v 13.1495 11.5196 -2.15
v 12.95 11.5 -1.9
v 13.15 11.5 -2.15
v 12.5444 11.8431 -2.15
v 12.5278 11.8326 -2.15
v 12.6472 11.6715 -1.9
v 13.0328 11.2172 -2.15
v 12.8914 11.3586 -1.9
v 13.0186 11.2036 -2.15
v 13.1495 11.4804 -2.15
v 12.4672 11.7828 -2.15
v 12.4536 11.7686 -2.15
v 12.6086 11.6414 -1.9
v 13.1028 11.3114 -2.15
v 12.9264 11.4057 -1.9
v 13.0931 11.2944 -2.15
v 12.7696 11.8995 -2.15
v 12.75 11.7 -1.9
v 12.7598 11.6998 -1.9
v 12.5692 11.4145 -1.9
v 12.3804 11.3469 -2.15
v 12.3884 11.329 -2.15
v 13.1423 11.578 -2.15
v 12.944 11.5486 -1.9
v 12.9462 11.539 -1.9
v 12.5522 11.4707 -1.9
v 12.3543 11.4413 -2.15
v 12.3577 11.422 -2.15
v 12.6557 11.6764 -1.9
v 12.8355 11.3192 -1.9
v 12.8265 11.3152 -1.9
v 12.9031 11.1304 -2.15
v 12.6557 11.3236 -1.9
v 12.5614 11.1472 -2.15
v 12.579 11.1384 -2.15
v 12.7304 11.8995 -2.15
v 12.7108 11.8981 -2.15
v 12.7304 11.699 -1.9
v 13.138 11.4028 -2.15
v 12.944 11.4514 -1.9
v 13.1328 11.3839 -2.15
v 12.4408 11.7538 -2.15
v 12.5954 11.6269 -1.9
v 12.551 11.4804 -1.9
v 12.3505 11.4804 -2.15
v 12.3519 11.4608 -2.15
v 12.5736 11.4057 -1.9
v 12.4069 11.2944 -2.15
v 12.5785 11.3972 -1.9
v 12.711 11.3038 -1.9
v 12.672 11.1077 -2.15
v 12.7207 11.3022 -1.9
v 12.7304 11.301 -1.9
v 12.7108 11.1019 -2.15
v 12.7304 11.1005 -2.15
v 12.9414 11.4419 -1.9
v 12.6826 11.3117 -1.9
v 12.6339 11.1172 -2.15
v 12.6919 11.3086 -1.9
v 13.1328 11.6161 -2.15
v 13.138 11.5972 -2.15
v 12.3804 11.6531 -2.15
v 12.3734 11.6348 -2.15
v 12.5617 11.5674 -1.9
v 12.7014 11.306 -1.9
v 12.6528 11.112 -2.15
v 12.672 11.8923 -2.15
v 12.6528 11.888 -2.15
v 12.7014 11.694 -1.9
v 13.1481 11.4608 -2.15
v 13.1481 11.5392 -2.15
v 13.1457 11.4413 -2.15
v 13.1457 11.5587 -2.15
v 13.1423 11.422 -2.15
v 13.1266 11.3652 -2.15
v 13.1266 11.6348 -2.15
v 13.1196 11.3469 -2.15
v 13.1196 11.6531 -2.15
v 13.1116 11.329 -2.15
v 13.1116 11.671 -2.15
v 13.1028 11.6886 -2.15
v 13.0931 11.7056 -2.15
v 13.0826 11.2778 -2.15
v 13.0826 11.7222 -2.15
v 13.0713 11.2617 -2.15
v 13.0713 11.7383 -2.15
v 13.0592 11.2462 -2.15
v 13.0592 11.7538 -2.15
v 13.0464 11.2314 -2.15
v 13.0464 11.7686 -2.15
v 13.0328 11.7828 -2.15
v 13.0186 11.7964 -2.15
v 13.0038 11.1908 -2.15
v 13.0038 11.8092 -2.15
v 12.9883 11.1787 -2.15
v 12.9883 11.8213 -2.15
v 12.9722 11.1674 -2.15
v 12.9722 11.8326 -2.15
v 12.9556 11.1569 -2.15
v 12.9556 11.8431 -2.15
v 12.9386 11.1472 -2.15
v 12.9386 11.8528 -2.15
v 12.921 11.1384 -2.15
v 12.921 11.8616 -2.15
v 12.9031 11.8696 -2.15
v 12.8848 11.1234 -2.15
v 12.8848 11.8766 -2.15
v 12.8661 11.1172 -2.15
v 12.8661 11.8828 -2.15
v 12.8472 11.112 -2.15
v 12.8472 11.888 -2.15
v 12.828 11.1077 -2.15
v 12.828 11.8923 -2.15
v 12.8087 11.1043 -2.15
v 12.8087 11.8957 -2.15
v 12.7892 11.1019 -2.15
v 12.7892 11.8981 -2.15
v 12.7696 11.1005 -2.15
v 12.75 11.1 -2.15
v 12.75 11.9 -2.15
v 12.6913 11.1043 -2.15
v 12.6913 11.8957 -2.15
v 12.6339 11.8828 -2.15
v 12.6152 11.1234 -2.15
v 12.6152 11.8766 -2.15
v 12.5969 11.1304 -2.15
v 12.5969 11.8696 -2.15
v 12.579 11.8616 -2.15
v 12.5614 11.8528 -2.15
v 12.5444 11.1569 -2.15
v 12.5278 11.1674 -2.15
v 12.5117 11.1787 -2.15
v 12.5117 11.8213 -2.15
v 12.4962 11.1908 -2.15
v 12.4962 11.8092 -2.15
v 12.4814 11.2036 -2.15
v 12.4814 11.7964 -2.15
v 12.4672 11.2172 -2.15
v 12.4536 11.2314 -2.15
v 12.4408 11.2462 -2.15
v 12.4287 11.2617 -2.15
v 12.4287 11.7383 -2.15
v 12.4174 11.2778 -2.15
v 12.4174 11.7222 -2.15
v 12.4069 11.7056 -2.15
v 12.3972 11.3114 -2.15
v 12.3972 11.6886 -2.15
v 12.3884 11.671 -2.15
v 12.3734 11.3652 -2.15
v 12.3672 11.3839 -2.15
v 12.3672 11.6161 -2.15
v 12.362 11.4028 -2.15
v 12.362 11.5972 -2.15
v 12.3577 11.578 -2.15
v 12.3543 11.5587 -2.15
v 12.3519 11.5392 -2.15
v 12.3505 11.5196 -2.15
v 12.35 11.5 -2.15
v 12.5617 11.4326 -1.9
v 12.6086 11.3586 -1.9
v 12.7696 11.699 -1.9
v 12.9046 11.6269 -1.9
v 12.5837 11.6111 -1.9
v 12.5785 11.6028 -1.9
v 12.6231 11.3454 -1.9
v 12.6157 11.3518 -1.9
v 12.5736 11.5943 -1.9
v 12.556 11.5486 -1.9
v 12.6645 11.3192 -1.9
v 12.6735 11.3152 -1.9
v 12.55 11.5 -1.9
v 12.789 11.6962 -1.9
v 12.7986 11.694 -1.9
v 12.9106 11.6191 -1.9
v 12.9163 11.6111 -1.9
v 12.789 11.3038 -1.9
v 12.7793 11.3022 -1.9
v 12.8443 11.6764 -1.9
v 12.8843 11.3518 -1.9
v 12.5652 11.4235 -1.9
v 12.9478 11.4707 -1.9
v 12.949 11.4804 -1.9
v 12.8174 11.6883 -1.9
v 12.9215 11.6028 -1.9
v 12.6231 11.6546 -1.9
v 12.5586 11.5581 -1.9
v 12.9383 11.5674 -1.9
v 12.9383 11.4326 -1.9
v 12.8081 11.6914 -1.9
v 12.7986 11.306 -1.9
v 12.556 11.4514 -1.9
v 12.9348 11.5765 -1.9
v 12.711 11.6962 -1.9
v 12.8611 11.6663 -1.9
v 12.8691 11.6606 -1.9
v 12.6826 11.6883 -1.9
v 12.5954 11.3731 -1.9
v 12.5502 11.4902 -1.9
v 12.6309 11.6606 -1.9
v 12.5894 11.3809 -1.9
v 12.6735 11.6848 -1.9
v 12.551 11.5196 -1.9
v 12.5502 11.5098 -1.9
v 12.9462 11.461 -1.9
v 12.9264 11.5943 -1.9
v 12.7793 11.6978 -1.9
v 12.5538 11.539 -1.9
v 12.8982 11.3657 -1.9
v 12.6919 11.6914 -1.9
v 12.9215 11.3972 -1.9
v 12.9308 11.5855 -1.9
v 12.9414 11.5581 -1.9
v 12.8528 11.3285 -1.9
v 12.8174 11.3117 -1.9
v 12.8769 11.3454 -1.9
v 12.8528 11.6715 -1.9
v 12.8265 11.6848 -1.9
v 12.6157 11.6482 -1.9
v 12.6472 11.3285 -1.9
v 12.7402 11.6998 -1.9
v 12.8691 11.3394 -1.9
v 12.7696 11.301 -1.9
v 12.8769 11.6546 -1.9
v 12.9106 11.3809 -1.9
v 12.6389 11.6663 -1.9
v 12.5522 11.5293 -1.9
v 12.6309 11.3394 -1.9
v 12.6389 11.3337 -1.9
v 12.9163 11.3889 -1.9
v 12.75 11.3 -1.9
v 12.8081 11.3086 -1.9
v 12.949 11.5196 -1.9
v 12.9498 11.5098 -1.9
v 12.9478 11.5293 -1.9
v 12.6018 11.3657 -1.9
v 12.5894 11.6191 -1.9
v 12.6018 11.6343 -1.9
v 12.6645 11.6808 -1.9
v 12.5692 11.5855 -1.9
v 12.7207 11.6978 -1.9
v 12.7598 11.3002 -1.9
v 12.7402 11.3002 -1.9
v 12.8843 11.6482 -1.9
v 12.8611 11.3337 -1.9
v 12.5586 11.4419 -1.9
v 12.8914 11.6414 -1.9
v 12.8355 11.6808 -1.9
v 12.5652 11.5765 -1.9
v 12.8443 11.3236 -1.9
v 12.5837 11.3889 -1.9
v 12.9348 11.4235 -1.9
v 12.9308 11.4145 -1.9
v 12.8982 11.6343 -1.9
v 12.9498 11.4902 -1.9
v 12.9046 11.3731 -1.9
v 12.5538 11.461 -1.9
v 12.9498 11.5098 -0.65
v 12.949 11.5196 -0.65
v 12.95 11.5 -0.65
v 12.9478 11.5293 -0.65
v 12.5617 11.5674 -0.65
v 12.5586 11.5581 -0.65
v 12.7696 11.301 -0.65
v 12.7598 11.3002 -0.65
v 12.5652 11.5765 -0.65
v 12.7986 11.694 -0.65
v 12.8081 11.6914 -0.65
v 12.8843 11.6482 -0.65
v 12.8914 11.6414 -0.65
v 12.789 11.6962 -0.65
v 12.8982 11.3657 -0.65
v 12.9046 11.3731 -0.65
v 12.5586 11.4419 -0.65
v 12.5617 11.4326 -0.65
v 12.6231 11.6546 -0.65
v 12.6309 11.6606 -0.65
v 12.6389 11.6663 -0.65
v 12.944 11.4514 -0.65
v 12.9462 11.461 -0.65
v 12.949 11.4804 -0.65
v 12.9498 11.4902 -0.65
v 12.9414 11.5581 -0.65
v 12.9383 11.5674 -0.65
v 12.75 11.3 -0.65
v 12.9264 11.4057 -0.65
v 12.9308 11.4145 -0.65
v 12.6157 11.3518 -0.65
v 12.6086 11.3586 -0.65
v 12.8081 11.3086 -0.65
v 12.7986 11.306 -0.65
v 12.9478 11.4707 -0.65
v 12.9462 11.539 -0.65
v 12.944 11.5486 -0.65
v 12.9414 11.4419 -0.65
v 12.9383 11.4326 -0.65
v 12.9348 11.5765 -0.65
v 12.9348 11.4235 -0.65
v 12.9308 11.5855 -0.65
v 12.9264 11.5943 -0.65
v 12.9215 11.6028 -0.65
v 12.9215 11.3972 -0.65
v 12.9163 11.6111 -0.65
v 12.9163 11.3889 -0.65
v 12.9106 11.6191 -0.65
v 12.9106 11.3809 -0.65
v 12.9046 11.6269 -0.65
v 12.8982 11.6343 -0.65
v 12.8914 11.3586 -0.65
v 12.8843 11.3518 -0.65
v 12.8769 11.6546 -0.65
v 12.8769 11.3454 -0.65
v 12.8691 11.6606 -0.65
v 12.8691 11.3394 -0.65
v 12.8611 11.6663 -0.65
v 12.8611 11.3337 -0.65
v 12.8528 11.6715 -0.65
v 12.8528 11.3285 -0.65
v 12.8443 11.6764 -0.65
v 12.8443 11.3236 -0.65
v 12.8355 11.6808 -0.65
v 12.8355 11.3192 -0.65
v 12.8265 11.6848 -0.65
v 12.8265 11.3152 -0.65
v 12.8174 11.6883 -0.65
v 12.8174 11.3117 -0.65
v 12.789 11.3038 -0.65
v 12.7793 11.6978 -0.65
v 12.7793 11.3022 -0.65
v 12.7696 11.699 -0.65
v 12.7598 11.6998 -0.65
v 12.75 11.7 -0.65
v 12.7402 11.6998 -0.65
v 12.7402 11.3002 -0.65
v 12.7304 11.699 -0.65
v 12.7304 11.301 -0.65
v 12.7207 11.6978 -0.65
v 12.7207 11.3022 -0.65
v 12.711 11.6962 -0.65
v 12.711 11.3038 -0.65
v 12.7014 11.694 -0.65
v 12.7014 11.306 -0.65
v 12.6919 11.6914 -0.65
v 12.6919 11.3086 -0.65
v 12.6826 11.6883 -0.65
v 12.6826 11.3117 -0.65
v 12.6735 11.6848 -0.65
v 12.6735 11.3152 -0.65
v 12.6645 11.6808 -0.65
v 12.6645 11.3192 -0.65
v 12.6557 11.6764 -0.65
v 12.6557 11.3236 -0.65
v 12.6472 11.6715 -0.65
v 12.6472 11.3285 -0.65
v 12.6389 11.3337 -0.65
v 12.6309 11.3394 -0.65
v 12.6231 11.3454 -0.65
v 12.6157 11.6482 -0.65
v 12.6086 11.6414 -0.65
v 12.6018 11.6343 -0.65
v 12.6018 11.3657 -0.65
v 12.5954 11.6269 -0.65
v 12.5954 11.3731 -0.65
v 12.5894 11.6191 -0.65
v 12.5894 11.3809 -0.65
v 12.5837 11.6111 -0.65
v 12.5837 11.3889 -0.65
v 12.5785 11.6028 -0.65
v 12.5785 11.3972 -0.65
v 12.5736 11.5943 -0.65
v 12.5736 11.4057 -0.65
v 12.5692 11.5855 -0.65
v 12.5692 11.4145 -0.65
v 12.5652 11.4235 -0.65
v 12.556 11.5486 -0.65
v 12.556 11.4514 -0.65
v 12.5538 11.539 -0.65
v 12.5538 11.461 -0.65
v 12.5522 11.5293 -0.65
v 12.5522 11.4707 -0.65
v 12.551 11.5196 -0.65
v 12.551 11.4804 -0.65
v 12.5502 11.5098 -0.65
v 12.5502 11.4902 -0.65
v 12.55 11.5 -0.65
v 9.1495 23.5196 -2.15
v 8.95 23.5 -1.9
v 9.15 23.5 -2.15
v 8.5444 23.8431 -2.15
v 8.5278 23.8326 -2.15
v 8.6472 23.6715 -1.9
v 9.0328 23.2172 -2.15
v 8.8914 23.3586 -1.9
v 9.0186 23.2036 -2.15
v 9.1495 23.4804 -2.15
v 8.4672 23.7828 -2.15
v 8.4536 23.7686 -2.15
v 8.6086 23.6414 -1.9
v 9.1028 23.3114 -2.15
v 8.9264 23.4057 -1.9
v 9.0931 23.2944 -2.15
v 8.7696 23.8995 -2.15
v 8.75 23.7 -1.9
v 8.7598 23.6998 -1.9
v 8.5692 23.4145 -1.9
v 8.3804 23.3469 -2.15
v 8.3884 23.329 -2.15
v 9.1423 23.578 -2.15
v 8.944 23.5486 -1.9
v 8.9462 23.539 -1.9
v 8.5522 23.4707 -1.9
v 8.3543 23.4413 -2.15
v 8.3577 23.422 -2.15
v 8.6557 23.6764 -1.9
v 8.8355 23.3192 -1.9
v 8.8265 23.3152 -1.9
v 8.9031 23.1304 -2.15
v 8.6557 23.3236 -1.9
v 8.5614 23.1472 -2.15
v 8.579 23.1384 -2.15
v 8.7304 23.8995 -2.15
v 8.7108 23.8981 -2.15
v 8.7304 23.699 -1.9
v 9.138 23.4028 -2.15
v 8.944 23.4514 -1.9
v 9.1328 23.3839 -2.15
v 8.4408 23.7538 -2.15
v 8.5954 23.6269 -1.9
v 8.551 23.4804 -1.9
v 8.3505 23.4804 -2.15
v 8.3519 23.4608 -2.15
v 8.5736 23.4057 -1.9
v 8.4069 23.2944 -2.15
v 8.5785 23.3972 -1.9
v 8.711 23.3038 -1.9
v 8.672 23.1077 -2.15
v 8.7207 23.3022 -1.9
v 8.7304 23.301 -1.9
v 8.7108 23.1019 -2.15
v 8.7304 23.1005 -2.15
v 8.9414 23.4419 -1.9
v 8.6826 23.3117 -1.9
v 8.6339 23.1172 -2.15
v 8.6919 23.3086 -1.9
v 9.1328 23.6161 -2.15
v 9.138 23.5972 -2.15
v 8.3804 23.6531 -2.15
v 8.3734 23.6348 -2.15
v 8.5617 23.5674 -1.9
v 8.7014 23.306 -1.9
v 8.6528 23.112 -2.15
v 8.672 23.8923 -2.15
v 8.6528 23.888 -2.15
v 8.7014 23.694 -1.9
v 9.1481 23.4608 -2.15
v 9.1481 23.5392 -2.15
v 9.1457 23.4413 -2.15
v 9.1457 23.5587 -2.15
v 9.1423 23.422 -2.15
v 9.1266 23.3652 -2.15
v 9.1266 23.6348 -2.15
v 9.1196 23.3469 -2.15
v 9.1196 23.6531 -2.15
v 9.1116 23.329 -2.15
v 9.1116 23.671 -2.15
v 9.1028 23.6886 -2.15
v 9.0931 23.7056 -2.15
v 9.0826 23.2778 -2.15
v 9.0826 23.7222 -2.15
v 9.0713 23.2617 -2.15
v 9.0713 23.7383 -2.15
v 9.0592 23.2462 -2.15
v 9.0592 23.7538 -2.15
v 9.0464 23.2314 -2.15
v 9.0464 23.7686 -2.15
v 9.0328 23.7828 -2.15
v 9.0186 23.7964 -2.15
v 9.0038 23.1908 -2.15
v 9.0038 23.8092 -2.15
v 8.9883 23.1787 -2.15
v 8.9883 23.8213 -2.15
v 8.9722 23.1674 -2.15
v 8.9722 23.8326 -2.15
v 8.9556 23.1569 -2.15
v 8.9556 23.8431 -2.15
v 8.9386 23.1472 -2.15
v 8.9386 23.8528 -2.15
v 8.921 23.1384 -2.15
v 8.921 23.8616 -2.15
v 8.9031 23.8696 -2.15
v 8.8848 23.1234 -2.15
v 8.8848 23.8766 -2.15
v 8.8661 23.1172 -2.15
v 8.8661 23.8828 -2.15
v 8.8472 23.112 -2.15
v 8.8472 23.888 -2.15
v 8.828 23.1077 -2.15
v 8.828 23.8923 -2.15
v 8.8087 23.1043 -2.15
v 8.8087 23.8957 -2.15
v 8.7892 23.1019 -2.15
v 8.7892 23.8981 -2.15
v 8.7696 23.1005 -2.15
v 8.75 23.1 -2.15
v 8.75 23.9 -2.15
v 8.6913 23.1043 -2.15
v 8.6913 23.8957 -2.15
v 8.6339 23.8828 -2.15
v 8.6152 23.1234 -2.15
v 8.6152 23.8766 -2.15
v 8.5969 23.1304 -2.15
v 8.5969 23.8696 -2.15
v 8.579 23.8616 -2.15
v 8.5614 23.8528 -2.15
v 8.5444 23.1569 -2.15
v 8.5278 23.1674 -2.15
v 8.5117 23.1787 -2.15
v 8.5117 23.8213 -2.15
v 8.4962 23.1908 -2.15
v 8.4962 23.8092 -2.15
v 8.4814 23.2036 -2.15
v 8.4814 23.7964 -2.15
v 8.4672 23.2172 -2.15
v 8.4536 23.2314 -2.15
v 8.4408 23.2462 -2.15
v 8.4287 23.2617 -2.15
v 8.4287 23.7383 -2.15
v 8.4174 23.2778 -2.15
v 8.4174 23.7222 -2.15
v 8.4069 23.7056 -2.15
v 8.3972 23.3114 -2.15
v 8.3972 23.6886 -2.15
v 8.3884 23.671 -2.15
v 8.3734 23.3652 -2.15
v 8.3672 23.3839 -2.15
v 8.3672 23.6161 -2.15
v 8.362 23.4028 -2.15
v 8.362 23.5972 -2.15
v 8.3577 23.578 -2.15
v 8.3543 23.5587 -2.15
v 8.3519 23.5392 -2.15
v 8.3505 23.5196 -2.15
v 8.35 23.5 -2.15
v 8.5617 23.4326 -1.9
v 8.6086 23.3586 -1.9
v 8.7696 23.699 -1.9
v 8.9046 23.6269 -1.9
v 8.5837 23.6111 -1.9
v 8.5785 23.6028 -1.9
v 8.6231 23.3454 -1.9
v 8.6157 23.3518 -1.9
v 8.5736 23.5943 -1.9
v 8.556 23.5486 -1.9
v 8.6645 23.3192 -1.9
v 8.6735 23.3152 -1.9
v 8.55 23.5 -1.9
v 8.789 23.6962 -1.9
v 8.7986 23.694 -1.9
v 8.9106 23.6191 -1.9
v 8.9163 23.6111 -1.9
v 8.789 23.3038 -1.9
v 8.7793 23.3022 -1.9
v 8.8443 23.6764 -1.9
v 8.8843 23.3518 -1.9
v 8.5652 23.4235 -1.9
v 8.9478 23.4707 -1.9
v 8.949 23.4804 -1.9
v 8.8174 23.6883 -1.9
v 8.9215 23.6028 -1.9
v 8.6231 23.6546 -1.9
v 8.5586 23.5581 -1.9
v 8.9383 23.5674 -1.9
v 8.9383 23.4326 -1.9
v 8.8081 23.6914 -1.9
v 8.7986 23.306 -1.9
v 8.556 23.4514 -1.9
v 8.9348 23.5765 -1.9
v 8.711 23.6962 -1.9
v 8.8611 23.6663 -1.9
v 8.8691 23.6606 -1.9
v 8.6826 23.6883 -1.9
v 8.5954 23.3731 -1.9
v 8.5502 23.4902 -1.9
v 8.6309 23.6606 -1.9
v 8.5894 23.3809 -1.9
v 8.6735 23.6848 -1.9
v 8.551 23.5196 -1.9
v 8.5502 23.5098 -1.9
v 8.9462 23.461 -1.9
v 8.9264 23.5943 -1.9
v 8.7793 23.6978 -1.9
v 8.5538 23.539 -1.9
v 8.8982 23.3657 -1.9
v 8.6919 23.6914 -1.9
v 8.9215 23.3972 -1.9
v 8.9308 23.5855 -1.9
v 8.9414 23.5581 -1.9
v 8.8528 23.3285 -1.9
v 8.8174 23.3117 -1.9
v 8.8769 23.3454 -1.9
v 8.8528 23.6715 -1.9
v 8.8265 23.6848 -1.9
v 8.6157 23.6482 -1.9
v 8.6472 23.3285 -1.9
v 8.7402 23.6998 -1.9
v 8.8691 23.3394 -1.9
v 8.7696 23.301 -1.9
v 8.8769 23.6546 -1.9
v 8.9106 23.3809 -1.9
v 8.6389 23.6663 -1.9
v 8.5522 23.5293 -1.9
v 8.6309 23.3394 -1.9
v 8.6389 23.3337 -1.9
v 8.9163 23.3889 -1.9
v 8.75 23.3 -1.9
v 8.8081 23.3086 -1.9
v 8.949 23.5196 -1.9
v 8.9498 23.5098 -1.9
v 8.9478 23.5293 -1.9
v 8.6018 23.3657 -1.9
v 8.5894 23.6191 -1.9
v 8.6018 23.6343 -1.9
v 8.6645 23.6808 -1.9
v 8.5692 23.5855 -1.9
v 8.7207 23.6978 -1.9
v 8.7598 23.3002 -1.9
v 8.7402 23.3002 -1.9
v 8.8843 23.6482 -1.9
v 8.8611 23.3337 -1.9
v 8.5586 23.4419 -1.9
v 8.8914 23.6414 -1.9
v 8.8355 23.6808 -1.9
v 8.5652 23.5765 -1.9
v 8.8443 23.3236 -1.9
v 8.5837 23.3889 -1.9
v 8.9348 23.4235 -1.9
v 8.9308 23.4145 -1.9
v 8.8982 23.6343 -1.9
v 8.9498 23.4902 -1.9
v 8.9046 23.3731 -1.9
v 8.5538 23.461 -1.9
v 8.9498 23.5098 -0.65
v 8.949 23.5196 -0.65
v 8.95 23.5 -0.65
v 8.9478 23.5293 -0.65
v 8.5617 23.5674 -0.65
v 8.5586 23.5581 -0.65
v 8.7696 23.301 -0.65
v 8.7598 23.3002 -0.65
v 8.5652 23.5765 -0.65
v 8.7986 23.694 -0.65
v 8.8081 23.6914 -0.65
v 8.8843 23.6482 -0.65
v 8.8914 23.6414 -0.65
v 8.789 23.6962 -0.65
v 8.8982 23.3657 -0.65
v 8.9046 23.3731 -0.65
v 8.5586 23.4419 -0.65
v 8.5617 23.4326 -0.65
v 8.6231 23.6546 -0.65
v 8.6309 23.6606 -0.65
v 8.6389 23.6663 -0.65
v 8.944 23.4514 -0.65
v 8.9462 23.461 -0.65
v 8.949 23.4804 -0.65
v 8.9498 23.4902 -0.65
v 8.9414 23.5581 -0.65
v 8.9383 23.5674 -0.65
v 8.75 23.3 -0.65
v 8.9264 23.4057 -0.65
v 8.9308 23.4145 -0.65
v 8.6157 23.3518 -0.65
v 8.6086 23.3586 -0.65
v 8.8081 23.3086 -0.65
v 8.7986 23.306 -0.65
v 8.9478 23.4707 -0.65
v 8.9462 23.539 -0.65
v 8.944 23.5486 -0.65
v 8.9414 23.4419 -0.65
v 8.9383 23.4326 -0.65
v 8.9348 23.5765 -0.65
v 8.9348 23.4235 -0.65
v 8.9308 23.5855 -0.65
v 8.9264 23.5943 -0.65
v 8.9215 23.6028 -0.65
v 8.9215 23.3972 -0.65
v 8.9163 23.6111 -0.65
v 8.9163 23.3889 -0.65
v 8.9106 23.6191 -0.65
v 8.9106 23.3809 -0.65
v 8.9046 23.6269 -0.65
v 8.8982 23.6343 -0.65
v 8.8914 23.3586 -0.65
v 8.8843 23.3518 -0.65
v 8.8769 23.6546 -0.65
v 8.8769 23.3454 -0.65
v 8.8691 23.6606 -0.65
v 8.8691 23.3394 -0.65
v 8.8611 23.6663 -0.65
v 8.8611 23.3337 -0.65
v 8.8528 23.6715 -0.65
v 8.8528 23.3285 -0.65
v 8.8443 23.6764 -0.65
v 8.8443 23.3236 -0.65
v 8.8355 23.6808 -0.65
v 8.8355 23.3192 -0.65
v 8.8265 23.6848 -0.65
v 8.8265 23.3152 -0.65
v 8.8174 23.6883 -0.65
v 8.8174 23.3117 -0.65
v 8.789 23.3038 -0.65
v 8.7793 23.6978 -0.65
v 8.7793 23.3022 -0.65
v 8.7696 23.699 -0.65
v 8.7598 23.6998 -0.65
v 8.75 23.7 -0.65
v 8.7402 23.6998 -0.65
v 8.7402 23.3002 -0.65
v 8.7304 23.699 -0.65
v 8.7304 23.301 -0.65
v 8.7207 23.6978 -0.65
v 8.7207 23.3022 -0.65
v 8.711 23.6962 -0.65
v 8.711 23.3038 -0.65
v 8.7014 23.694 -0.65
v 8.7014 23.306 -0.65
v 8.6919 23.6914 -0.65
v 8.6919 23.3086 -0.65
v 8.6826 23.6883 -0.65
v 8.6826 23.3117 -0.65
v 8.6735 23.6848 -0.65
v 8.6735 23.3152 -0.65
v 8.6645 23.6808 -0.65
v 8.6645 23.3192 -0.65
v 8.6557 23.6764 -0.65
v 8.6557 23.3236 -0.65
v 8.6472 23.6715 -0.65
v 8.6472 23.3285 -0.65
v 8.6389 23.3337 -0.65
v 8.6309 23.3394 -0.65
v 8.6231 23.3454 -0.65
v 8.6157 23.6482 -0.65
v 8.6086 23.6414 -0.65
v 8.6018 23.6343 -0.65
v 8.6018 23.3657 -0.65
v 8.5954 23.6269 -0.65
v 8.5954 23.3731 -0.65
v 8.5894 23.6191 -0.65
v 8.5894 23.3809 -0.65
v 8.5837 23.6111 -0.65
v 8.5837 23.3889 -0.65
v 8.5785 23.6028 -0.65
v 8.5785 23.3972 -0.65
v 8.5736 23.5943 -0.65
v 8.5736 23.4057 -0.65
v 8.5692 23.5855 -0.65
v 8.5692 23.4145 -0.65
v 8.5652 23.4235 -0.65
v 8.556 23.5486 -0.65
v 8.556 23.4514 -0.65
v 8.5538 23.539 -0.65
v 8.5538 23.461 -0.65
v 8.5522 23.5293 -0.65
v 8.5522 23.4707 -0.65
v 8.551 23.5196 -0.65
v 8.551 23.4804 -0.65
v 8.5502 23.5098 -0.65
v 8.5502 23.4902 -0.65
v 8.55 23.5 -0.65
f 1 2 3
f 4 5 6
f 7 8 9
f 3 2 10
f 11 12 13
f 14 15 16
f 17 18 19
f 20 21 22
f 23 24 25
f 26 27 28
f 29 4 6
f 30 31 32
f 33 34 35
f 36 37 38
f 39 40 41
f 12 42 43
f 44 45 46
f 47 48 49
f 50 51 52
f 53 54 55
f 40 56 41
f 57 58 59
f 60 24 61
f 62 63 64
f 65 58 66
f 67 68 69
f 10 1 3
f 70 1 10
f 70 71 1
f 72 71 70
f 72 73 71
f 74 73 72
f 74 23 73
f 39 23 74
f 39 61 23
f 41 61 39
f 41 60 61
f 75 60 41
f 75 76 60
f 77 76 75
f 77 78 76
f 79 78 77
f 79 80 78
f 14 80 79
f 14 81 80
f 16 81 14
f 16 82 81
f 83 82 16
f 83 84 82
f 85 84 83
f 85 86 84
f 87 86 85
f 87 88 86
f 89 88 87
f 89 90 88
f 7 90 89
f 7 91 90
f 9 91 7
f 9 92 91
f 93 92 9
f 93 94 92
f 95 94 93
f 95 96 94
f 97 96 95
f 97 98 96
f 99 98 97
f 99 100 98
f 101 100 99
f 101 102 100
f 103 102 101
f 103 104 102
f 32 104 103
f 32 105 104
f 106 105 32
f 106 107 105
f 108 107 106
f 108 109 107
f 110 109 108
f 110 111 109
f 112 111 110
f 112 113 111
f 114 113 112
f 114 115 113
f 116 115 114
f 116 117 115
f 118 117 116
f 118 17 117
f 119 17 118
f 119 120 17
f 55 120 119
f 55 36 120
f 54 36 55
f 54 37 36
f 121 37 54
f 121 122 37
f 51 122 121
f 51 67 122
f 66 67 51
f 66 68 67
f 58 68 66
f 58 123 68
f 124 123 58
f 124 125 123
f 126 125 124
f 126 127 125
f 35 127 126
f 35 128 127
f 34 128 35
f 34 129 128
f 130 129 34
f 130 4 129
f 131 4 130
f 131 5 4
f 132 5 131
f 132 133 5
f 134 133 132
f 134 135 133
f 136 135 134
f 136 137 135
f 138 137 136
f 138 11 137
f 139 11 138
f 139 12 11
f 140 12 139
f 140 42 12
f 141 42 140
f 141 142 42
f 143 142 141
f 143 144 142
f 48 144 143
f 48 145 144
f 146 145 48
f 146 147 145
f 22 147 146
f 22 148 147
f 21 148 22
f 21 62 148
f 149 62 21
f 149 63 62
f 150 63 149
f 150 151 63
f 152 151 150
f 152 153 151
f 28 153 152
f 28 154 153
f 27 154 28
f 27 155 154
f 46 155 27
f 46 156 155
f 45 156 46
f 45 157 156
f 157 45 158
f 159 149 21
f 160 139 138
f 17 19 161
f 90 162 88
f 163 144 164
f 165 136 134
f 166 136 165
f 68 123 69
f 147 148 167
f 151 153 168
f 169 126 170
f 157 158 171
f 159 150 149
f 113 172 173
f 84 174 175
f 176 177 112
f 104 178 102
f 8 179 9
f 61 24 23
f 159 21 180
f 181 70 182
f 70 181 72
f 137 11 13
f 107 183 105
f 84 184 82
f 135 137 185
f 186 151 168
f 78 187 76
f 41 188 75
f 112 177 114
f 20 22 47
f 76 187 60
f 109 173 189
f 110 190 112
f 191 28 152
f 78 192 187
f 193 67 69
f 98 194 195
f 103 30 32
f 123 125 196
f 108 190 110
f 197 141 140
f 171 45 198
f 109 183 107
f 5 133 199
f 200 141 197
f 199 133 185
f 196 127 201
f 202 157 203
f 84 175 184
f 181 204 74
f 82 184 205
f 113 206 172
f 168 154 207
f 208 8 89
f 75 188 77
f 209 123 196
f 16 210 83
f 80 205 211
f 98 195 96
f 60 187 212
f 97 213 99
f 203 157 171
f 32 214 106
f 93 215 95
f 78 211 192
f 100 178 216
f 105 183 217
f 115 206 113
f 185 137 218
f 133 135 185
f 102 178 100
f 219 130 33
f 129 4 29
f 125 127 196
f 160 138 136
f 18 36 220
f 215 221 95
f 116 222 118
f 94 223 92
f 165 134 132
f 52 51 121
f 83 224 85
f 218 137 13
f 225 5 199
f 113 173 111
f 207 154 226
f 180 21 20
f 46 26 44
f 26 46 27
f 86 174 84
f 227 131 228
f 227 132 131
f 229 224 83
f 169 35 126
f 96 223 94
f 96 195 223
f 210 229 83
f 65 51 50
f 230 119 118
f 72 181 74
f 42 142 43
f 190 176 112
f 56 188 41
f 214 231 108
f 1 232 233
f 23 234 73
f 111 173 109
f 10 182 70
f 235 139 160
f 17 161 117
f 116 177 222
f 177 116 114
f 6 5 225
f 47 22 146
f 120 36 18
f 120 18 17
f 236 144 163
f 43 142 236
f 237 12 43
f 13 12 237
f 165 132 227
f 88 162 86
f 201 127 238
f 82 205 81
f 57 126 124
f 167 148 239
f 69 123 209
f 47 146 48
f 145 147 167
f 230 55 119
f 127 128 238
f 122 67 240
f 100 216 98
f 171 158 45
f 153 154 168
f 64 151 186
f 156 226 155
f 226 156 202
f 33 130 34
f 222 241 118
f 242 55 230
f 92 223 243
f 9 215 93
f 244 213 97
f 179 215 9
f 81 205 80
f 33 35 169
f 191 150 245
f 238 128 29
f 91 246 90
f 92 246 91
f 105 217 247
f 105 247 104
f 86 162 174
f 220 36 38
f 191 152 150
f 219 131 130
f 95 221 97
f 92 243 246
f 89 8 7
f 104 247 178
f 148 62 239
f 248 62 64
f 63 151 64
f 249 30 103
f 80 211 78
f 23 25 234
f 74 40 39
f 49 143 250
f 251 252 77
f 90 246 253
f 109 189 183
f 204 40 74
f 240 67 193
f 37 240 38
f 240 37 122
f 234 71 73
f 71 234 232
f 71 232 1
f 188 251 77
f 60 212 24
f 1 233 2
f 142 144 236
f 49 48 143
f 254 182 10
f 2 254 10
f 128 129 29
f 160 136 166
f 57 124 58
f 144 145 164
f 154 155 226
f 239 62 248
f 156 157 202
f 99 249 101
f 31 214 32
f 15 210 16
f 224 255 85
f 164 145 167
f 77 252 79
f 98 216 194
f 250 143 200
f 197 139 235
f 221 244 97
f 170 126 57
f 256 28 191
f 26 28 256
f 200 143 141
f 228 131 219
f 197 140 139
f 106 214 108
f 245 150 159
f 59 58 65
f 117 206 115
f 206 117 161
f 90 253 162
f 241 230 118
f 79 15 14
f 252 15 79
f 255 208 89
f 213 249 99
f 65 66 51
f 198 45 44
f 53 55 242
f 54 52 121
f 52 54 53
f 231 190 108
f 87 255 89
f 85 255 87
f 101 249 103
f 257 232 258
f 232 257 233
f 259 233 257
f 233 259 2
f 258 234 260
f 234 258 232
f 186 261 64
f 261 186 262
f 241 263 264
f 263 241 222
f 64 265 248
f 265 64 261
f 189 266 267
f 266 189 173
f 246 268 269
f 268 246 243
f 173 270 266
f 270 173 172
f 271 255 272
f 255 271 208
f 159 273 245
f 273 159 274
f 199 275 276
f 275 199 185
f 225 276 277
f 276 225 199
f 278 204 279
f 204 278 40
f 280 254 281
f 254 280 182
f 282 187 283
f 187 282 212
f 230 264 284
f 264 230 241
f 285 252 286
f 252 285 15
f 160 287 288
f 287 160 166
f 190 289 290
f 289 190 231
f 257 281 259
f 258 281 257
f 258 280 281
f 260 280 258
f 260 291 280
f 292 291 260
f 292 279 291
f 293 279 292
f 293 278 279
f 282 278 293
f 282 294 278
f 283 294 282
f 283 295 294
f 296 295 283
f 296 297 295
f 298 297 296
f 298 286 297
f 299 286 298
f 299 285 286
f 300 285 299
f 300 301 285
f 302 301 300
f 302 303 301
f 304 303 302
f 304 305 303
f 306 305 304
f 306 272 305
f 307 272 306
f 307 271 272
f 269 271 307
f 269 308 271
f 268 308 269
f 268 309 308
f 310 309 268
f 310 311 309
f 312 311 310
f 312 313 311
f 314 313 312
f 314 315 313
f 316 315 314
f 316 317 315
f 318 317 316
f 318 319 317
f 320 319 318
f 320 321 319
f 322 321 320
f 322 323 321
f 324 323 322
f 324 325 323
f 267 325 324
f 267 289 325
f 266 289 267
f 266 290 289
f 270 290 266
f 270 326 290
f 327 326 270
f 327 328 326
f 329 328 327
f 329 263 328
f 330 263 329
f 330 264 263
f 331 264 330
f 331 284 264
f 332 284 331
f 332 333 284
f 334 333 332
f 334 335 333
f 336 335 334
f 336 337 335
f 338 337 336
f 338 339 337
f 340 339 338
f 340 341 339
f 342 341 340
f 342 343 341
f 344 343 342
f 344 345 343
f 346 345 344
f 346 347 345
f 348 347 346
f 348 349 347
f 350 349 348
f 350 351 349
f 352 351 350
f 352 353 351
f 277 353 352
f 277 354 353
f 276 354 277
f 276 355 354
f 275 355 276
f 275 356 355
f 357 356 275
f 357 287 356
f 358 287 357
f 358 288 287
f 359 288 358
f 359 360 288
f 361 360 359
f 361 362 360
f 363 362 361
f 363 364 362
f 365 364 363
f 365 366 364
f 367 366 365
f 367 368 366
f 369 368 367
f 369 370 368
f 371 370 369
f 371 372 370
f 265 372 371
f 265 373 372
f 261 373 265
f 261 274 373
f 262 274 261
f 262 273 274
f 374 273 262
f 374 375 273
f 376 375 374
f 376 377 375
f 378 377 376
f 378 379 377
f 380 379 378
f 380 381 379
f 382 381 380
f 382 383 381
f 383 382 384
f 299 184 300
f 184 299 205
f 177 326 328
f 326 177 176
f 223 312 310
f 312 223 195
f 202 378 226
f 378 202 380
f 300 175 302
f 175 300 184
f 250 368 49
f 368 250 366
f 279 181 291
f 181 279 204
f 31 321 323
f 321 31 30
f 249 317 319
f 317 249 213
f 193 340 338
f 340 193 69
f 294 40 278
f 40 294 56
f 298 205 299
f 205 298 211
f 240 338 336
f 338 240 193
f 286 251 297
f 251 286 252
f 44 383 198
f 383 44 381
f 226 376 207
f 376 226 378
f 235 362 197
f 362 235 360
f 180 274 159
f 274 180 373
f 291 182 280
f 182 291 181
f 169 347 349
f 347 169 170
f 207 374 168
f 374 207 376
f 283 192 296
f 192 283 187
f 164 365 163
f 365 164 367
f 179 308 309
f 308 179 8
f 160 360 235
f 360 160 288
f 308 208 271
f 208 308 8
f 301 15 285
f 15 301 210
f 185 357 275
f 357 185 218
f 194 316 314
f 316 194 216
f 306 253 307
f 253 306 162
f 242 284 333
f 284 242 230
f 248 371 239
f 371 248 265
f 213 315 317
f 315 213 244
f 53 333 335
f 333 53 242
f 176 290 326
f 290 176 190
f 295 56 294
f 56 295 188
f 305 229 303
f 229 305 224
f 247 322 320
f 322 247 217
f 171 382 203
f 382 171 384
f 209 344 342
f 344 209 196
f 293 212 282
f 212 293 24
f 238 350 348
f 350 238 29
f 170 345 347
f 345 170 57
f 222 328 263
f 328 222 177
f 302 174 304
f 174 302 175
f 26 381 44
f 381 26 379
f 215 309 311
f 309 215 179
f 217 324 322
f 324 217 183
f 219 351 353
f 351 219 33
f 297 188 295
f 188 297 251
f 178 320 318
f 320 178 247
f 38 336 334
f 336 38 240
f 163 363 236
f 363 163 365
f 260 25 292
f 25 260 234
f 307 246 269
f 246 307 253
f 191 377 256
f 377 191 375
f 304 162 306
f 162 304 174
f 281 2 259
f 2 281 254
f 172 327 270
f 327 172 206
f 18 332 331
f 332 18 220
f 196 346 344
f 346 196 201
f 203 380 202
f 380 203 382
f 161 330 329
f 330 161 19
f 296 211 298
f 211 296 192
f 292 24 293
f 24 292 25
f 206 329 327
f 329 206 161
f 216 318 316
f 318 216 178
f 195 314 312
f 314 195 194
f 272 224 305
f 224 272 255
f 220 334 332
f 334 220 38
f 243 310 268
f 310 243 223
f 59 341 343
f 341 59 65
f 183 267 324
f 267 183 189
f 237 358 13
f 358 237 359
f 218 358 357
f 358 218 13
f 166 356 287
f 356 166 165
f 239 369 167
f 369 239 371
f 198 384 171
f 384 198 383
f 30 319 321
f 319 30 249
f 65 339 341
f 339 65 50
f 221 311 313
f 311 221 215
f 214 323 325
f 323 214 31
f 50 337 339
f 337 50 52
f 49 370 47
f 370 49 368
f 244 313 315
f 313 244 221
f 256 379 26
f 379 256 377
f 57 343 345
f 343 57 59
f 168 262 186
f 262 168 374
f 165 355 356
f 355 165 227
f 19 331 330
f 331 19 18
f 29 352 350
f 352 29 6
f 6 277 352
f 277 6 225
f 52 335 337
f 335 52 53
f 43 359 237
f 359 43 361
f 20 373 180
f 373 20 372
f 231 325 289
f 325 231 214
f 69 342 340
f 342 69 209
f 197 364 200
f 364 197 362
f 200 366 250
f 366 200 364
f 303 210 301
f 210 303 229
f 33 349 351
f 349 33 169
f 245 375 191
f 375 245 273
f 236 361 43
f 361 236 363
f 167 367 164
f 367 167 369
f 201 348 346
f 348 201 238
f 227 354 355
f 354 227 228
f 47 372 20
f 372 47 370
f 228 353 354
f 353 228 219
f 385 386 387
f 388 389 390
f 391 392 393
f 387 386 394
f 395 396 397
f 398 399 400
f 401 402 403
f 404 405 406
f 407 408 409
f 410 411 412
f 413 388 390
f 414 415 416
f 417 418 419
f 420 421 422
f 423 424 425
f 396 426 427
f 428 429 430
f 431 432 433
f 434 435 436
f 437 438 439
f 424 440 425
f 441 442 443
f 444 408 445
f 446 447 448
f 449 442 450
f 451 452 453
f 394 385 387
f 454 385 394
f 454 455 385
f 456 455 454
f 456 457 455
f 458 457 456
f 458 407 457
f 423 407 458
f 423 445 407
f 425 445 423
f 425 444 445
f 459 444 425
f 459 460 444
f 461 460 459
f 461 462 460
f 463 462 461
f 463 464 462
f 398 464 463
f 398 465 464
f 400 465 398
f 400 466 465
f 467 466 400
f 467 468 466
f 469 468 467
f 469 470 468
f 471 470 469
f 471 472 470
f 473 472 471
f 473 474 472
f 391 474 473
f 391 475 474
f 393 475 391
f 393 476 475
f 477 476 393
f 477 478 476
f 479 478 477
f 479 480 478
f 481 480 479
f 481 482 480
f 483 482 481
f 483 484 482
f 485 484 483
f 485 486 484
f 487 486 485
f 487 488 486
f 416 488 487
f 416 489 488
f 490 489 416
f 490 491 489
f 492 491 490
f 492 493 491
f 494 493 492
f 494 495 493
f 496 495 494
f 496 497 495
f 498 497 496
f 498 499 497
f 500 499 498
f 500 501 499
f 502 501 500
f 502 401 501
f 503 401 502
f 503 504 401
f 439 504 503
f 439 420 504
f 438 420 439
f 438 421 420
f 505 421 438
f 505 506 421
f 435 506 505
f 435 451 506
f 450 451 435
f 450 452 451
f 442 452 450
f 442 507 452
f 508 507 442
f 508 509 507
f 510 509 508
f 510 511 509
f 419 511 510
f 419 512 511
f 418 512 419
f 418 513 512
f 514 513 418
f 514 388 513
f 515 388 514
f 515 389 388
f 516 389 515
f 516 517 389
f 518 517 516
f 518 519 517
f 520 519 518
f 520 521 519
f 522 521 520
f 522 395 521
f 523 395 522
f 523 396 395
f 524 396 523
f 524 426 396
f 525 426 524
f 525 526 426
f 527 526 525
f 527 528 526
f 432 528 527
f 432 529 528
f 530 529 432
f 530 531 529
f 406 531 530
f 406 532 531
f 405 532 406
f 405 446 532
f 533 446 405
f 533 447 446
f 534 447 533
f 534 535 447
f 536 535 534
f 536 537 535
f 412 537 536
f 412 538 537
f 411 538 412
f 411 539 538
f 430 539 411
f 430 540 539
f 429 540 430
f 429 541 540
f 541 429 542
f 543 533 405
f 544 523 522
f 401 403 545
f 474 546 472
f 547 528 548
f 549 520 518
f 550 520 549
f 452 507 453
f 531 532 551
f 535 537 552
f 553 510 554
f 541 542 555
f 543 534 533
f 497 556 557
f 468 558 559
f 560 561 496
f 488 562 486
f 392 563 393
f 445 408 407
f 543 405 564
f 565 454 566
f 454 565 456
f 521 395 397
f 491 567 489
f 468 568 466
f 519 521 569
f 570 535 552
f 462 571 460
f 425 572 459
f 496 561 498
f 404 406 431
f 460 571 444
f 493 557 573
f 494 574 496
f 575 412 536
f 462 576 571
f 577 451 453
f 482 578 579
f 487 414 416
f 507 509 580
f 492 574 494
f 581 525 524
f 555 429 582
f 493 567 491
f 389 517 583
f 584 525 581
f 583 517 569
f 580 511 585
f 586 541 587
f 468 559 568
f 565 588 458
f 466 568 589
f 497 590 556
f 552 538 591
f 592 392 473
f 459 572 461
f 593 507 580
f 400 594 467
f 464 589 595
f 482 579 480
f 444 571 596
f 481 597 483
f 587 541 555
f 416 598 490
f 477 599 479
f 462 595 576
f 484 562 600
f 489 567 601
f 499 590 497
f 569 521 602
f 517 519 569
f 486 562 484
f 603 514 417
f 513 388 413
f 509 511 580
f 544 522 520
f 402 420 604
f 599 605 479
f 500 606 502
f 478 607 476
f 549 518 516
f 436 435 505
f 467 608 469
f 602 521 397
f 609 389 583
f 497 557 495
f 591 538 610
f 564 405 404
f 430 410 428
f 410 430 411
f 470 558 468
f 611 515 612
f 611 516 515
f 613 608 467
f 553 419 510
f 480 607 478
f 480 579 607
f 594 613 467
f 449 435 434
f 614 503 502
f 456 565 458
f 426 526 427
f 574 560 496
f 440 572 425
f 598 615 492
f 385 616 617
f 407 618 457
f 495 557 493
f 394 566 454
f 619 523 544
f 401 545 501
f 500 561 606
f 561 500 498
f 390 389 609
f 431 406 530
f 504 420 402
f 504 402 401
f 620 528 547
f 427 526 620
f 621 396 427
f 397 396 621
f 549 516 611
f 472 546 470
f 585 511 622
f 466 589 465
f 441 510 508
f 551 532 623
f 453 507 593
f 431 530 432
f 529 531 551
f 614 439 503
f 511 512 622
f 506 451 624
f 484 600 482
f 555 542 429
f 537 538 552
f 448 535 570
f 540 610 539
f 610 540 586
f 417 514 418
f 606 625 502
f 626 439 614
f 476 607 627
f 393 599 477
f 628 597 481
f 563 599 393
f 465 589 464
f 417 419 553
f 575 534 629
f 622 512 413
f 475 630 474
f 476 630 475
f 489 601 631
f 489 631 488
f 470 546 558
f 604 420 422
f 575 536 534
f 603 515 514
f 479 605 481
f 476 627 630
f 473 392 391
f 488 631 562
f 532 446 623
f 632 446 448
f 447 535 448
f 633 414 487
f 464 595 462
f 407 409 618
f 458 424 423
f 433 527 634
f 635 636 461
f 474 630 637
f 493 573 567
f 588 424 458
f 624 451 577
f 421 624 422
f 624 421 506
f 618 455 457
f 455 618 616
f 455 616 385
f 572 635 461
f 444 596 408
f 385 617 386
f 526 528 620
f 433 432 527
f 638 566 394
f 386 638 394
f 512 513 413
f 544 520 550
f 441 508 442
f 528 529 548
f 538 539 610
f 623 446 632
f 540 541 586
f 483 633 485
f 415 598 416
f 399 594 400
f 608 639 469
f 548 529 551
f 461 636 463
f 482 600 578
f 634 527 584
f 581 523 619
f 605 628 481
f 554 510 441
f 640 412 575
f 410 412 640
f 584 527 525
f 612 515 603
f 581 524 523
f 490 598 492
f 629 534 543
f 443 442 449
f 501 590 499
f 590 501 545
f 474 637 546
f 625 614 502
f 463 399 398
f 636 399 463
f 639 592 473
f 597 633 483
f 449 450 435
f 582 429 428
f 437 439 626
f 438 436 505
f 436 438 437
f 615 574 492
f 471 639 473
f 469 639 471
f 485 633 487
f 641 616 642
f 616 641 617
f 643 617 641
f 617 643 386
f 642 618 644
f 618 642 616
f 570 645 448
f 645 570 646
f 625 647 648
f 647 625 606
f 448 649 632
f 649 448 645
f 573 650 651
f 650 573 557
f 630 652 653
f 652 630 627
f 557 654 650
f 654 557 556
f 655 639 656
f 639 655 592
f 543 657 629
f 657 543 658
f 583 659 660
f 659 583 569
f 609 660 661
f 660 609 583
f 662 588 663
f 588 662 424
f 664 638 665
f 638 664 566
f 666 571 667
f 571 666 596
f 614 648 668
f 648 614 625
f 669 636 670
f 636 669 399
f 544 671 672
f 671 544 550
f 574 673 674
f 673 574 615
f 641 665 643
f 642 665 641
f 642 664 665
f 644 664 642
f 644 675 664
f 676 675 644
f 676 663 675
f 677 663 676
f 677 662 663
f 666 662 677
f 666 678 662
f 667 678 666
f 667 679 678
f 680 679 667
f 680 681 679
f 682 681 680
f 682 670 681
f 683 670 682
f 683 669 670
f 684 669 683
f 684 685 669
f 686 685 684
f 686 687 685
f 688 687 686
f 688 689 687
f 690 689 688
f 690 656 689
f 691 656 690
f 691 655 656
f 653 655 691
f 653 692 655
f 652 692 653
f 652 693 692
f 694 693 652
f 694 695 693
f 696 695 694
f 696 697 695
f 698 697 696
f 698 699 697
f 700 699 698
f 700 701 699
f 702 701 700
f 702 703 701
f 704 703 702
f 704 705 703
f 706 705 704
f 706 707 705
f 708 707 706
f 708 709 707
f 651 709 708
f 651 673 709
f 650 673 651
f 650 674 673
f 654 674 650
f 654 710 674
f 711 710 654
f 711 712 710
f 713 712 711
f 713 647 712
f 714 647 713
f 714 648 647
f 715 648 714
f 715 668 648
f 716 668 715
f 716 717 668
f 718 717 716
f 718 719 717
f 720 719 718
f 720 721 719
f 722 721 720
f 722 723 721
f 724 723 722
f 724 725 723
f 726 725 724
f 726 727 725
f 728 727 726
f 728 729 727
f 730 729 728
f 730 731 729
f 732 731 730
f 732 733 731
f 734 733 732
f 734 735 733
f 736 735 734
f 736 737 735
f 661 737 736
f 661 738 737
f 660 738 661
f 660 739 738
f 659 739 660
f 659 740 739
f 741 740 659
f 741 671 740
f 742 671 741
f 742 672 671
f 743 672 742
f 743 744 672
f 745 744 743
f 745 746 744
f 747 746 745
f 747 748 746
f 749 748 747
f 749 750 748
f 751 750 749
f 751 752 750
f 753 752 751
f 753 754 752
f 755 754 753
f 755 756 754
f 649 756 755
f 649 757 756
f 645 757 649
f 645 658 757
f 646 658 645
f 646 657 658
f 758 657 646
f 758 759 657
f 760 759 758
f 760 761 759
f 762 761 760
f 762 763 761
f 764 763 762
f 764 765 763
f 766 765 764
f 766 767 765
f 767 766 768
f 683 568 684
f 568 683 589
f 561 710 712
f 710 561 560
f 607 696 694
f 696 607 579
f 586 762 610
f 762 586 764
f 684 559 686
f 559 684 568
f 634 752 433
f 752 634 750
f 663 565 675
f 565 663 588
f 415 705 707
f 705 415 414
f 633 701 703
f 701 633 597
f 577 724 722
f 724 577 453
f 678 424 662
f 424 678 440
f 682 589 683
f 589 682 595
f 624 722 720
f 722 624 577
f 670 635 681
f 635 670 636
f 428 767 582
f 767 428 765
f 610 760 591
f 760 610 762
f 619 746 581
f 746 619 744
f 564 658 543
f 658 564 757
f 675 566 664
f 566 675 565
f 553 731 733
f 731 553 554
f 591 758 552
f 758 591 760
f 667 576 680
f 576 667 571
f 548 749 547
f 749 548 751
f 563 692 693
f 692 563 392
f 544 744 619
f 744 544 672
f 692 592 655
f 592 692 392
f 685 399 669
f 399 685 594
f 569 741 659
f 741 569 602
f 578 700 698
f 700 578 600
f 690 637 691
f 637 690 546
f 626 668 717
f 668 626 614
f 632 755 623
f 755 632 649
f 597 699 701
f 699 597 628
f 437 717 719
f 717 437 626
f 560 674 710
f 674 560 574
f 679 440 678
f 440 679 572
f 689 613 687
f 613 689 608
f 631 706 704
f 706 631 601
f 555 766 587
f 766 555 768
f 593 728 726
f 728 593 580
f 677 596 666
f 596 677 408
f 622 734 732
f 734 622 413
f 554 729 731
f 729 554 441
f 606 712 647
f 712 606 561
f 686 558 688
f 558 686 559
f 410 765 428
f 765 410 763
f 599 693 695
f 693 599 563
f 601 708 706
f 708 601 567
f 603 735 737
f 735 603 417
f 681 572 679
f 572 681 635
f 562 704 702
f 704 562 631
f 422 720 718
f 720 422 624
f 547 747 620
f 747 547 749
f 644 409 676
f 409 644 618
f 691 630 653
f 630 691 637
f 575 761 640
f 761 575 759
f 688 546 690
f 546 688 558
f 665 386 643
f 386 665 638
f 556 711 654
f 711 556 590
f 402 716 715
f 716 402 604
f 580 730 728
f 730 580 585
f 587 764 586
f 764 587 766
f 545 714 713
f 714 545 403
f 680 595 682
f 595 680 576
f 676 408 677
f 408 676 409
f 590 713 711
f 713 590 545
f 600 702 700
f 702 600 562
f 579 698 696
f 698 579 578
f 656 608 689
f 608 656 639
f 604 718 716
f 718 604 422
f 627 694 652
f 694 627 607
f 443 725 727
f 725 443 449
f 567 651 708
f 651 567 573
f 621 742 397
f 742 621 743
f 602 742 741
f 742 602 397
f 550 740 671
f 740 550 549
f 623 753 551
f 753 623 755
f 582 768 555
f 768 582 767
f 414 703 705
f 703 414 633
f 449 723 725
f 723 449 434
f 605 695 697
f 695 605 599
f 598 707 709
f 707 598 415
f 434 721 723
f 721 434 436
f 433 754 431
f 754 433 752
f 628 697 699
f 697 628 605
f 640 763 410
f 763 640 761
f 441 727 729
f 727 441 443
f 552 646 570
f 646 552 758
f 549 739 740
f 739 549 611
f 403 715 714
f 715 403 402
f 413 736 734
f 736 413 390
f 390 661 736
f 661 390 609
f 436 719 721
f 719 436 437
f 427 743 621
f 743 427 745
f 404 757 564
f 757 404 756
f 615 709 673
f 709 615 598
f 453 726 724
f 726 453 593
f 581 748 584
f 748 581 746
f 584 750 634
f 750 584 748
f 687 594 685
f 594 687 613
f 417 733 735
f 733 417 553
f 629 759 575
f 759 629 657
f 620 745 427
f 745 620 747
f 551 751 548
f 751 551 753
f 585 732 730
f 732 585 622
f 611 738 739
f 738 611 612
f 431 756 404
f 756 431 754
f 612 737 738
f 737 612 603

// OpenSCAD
// file: ../../common/_electronics_layout.scad
// Layout type (can be overridden via command line -D "layout_type=\"...\"")
layout_type = "sarcaster"; // options: "sarcaster", "flying_v", "les_paul"

// Dynamic radii based on layout type
cav_radius = (layout_type == "flying_v") ? 0.9 :
             (layout_type == "les_paul") ? 1.2 :
             1.5;

mask_radius = (layout_type == "flying_v") ? 1.15 :
              (layout_type == "les_paul") ? 1.45 :
              1.75;

// Default (Sarcaster)
vol1_pos = (layout_type == "flying_v") ? [10.2, 13.5, 0.7] :
           (layout_type == "les_paul") ? [9.0, 15.5, 0.7] :
           [7.5, 18.0, 0.7];

vol2_pos = (layout_type == "flying_v") ? [11.0, 10.5, 0.7] :
           (layout_type == "les_paul") ? [10.5, 11.5, 0.7] :
           [12.0, 13.5, 0.7];

switch_pos = (layout_type == "flying_v") ? [8.3, 16.5, 0.7] :
             (layout_type == "les_paul") ? [5.0, 19.5, 0.7] :
             [9.0, 22.5, 0.7];

switch_rot = (layout_type == "flying_v") ? [0, 0, 107] :
             (layout_type == "les_paul") ? [0, 0, 0] :
             [0, 0, -60];

jack_pos = (layout_type == "flying_v") ? [12.0, 7.5, -0.3] :
           (layout_type == "les_paul") ? [11.0, 6.5, -0.3] :
           [11.0, 6.0, -0.3];

jack_rot = (layout_type == "flying_v") ? [0, 0, 153] :
           (layout_type == "les_paul") ? [0, 0, 45] :
           [0, 0, 45];

// Cavity points
cav_p1 = (layout_type == "flying_v") ? [8.3, 16.5] : (layout_type == "les_paul") ? [5.0, 19.5] : [7.5, 18.0];
cav_p2 = (layout_type == "flying_v") ? [15.22, 1.17] : (layout_type == "les_paul") ? [11.0, 6.5] : [12.0, 13.5];
cav_p3 = (layout_type == "flying_v") ? [8.3, 16.5] : (layout_type == "les_paul") ? [7.5, 14.5] : [8.75, 21.5];
cav_p4 = (layout_type == "flying_v") ? [15.22, 1.17] : (layout_type == "les_paul") ? [11.0, 11.5] : [10.75, 17.5];

// Mask points
mask_p1 = (layout_type == "flying_v") ? [8.3, 16.5] : (layout_type == "les_paul") ? [5.0, 19.5] : [7.5, 18.0];
mask_p2 = (layout_type == "flying_v") ? [15.22, 1.17]  : (layout_type == "les_paul") ? [11.0, 6.5]  : [12.5, 12.5];
mask_p3 = (layout_type == "flying_v") ? [8.3, 16.5]  : (layout_type == "les_paul") ? [7.0, 14.5] : [8.75, 22.5];
mask_p4 = (layout_type == "flying_v") ? [15.22, 1.17]  : (layout_type == "les_paul") ? [11.5, 11.5] : [10.75, 17.5];

// Screw points
screw_p1 = (layout_type == "flying_v") ? [14.8, 2.0, -2.15] : (layout_type == "les_paul") ? [11.0, 5.5, -2.15] : [12.75, 11.5, -2.15];
screw_p2 = (layout_type == "flying_v") ? [8.1, 17.0, -2.15]  : (layout_type == "les_paul") ? [5.0, 20.5, -2.15]  : [8.75, 23.5, -2.15];

// Wire channels
pickup_wire_start = (layout_type == "flying_v") ? [0.0, 14.5] : (layout_type == "les_paul") ? [3.0, 18.0] : [3.0, 21.0];
pickup_wire_end   = (layout_type == "flying_v") ? [8.3, 16.5] : (layout_type == "les_paul") ? [8.0, 19.5] : [9.0, 21.0];

jack_wire_start = (layout_type == "flying_v") ? [11.0, 10.5]  : (layout_type == "les_paul") ? [10.5, 11.5] : [9.0, 15.0];
jack_wire_end   = (layout_type == "flying_v") ? [12.0, 7.5]  : (layout_type == "les_paul") ? [11.0, 6.5]  : [8.0, 9.0];
// main file
// Import the rounded_poly module
include <../../common/_electronics_layout.scad>
$fn=128;

module screw()
{
    union() {
        cylinder(0.25, 0.4, 0.2);
        cylinder(1.5, 0.2, 0.2);
    }
}

module elec_backplate_fixings()
{
    union()
    {
        translate(screw_p1) screw();
        translate(screw_p2) screw();
    }    
}

elec_backplate_fixings();
